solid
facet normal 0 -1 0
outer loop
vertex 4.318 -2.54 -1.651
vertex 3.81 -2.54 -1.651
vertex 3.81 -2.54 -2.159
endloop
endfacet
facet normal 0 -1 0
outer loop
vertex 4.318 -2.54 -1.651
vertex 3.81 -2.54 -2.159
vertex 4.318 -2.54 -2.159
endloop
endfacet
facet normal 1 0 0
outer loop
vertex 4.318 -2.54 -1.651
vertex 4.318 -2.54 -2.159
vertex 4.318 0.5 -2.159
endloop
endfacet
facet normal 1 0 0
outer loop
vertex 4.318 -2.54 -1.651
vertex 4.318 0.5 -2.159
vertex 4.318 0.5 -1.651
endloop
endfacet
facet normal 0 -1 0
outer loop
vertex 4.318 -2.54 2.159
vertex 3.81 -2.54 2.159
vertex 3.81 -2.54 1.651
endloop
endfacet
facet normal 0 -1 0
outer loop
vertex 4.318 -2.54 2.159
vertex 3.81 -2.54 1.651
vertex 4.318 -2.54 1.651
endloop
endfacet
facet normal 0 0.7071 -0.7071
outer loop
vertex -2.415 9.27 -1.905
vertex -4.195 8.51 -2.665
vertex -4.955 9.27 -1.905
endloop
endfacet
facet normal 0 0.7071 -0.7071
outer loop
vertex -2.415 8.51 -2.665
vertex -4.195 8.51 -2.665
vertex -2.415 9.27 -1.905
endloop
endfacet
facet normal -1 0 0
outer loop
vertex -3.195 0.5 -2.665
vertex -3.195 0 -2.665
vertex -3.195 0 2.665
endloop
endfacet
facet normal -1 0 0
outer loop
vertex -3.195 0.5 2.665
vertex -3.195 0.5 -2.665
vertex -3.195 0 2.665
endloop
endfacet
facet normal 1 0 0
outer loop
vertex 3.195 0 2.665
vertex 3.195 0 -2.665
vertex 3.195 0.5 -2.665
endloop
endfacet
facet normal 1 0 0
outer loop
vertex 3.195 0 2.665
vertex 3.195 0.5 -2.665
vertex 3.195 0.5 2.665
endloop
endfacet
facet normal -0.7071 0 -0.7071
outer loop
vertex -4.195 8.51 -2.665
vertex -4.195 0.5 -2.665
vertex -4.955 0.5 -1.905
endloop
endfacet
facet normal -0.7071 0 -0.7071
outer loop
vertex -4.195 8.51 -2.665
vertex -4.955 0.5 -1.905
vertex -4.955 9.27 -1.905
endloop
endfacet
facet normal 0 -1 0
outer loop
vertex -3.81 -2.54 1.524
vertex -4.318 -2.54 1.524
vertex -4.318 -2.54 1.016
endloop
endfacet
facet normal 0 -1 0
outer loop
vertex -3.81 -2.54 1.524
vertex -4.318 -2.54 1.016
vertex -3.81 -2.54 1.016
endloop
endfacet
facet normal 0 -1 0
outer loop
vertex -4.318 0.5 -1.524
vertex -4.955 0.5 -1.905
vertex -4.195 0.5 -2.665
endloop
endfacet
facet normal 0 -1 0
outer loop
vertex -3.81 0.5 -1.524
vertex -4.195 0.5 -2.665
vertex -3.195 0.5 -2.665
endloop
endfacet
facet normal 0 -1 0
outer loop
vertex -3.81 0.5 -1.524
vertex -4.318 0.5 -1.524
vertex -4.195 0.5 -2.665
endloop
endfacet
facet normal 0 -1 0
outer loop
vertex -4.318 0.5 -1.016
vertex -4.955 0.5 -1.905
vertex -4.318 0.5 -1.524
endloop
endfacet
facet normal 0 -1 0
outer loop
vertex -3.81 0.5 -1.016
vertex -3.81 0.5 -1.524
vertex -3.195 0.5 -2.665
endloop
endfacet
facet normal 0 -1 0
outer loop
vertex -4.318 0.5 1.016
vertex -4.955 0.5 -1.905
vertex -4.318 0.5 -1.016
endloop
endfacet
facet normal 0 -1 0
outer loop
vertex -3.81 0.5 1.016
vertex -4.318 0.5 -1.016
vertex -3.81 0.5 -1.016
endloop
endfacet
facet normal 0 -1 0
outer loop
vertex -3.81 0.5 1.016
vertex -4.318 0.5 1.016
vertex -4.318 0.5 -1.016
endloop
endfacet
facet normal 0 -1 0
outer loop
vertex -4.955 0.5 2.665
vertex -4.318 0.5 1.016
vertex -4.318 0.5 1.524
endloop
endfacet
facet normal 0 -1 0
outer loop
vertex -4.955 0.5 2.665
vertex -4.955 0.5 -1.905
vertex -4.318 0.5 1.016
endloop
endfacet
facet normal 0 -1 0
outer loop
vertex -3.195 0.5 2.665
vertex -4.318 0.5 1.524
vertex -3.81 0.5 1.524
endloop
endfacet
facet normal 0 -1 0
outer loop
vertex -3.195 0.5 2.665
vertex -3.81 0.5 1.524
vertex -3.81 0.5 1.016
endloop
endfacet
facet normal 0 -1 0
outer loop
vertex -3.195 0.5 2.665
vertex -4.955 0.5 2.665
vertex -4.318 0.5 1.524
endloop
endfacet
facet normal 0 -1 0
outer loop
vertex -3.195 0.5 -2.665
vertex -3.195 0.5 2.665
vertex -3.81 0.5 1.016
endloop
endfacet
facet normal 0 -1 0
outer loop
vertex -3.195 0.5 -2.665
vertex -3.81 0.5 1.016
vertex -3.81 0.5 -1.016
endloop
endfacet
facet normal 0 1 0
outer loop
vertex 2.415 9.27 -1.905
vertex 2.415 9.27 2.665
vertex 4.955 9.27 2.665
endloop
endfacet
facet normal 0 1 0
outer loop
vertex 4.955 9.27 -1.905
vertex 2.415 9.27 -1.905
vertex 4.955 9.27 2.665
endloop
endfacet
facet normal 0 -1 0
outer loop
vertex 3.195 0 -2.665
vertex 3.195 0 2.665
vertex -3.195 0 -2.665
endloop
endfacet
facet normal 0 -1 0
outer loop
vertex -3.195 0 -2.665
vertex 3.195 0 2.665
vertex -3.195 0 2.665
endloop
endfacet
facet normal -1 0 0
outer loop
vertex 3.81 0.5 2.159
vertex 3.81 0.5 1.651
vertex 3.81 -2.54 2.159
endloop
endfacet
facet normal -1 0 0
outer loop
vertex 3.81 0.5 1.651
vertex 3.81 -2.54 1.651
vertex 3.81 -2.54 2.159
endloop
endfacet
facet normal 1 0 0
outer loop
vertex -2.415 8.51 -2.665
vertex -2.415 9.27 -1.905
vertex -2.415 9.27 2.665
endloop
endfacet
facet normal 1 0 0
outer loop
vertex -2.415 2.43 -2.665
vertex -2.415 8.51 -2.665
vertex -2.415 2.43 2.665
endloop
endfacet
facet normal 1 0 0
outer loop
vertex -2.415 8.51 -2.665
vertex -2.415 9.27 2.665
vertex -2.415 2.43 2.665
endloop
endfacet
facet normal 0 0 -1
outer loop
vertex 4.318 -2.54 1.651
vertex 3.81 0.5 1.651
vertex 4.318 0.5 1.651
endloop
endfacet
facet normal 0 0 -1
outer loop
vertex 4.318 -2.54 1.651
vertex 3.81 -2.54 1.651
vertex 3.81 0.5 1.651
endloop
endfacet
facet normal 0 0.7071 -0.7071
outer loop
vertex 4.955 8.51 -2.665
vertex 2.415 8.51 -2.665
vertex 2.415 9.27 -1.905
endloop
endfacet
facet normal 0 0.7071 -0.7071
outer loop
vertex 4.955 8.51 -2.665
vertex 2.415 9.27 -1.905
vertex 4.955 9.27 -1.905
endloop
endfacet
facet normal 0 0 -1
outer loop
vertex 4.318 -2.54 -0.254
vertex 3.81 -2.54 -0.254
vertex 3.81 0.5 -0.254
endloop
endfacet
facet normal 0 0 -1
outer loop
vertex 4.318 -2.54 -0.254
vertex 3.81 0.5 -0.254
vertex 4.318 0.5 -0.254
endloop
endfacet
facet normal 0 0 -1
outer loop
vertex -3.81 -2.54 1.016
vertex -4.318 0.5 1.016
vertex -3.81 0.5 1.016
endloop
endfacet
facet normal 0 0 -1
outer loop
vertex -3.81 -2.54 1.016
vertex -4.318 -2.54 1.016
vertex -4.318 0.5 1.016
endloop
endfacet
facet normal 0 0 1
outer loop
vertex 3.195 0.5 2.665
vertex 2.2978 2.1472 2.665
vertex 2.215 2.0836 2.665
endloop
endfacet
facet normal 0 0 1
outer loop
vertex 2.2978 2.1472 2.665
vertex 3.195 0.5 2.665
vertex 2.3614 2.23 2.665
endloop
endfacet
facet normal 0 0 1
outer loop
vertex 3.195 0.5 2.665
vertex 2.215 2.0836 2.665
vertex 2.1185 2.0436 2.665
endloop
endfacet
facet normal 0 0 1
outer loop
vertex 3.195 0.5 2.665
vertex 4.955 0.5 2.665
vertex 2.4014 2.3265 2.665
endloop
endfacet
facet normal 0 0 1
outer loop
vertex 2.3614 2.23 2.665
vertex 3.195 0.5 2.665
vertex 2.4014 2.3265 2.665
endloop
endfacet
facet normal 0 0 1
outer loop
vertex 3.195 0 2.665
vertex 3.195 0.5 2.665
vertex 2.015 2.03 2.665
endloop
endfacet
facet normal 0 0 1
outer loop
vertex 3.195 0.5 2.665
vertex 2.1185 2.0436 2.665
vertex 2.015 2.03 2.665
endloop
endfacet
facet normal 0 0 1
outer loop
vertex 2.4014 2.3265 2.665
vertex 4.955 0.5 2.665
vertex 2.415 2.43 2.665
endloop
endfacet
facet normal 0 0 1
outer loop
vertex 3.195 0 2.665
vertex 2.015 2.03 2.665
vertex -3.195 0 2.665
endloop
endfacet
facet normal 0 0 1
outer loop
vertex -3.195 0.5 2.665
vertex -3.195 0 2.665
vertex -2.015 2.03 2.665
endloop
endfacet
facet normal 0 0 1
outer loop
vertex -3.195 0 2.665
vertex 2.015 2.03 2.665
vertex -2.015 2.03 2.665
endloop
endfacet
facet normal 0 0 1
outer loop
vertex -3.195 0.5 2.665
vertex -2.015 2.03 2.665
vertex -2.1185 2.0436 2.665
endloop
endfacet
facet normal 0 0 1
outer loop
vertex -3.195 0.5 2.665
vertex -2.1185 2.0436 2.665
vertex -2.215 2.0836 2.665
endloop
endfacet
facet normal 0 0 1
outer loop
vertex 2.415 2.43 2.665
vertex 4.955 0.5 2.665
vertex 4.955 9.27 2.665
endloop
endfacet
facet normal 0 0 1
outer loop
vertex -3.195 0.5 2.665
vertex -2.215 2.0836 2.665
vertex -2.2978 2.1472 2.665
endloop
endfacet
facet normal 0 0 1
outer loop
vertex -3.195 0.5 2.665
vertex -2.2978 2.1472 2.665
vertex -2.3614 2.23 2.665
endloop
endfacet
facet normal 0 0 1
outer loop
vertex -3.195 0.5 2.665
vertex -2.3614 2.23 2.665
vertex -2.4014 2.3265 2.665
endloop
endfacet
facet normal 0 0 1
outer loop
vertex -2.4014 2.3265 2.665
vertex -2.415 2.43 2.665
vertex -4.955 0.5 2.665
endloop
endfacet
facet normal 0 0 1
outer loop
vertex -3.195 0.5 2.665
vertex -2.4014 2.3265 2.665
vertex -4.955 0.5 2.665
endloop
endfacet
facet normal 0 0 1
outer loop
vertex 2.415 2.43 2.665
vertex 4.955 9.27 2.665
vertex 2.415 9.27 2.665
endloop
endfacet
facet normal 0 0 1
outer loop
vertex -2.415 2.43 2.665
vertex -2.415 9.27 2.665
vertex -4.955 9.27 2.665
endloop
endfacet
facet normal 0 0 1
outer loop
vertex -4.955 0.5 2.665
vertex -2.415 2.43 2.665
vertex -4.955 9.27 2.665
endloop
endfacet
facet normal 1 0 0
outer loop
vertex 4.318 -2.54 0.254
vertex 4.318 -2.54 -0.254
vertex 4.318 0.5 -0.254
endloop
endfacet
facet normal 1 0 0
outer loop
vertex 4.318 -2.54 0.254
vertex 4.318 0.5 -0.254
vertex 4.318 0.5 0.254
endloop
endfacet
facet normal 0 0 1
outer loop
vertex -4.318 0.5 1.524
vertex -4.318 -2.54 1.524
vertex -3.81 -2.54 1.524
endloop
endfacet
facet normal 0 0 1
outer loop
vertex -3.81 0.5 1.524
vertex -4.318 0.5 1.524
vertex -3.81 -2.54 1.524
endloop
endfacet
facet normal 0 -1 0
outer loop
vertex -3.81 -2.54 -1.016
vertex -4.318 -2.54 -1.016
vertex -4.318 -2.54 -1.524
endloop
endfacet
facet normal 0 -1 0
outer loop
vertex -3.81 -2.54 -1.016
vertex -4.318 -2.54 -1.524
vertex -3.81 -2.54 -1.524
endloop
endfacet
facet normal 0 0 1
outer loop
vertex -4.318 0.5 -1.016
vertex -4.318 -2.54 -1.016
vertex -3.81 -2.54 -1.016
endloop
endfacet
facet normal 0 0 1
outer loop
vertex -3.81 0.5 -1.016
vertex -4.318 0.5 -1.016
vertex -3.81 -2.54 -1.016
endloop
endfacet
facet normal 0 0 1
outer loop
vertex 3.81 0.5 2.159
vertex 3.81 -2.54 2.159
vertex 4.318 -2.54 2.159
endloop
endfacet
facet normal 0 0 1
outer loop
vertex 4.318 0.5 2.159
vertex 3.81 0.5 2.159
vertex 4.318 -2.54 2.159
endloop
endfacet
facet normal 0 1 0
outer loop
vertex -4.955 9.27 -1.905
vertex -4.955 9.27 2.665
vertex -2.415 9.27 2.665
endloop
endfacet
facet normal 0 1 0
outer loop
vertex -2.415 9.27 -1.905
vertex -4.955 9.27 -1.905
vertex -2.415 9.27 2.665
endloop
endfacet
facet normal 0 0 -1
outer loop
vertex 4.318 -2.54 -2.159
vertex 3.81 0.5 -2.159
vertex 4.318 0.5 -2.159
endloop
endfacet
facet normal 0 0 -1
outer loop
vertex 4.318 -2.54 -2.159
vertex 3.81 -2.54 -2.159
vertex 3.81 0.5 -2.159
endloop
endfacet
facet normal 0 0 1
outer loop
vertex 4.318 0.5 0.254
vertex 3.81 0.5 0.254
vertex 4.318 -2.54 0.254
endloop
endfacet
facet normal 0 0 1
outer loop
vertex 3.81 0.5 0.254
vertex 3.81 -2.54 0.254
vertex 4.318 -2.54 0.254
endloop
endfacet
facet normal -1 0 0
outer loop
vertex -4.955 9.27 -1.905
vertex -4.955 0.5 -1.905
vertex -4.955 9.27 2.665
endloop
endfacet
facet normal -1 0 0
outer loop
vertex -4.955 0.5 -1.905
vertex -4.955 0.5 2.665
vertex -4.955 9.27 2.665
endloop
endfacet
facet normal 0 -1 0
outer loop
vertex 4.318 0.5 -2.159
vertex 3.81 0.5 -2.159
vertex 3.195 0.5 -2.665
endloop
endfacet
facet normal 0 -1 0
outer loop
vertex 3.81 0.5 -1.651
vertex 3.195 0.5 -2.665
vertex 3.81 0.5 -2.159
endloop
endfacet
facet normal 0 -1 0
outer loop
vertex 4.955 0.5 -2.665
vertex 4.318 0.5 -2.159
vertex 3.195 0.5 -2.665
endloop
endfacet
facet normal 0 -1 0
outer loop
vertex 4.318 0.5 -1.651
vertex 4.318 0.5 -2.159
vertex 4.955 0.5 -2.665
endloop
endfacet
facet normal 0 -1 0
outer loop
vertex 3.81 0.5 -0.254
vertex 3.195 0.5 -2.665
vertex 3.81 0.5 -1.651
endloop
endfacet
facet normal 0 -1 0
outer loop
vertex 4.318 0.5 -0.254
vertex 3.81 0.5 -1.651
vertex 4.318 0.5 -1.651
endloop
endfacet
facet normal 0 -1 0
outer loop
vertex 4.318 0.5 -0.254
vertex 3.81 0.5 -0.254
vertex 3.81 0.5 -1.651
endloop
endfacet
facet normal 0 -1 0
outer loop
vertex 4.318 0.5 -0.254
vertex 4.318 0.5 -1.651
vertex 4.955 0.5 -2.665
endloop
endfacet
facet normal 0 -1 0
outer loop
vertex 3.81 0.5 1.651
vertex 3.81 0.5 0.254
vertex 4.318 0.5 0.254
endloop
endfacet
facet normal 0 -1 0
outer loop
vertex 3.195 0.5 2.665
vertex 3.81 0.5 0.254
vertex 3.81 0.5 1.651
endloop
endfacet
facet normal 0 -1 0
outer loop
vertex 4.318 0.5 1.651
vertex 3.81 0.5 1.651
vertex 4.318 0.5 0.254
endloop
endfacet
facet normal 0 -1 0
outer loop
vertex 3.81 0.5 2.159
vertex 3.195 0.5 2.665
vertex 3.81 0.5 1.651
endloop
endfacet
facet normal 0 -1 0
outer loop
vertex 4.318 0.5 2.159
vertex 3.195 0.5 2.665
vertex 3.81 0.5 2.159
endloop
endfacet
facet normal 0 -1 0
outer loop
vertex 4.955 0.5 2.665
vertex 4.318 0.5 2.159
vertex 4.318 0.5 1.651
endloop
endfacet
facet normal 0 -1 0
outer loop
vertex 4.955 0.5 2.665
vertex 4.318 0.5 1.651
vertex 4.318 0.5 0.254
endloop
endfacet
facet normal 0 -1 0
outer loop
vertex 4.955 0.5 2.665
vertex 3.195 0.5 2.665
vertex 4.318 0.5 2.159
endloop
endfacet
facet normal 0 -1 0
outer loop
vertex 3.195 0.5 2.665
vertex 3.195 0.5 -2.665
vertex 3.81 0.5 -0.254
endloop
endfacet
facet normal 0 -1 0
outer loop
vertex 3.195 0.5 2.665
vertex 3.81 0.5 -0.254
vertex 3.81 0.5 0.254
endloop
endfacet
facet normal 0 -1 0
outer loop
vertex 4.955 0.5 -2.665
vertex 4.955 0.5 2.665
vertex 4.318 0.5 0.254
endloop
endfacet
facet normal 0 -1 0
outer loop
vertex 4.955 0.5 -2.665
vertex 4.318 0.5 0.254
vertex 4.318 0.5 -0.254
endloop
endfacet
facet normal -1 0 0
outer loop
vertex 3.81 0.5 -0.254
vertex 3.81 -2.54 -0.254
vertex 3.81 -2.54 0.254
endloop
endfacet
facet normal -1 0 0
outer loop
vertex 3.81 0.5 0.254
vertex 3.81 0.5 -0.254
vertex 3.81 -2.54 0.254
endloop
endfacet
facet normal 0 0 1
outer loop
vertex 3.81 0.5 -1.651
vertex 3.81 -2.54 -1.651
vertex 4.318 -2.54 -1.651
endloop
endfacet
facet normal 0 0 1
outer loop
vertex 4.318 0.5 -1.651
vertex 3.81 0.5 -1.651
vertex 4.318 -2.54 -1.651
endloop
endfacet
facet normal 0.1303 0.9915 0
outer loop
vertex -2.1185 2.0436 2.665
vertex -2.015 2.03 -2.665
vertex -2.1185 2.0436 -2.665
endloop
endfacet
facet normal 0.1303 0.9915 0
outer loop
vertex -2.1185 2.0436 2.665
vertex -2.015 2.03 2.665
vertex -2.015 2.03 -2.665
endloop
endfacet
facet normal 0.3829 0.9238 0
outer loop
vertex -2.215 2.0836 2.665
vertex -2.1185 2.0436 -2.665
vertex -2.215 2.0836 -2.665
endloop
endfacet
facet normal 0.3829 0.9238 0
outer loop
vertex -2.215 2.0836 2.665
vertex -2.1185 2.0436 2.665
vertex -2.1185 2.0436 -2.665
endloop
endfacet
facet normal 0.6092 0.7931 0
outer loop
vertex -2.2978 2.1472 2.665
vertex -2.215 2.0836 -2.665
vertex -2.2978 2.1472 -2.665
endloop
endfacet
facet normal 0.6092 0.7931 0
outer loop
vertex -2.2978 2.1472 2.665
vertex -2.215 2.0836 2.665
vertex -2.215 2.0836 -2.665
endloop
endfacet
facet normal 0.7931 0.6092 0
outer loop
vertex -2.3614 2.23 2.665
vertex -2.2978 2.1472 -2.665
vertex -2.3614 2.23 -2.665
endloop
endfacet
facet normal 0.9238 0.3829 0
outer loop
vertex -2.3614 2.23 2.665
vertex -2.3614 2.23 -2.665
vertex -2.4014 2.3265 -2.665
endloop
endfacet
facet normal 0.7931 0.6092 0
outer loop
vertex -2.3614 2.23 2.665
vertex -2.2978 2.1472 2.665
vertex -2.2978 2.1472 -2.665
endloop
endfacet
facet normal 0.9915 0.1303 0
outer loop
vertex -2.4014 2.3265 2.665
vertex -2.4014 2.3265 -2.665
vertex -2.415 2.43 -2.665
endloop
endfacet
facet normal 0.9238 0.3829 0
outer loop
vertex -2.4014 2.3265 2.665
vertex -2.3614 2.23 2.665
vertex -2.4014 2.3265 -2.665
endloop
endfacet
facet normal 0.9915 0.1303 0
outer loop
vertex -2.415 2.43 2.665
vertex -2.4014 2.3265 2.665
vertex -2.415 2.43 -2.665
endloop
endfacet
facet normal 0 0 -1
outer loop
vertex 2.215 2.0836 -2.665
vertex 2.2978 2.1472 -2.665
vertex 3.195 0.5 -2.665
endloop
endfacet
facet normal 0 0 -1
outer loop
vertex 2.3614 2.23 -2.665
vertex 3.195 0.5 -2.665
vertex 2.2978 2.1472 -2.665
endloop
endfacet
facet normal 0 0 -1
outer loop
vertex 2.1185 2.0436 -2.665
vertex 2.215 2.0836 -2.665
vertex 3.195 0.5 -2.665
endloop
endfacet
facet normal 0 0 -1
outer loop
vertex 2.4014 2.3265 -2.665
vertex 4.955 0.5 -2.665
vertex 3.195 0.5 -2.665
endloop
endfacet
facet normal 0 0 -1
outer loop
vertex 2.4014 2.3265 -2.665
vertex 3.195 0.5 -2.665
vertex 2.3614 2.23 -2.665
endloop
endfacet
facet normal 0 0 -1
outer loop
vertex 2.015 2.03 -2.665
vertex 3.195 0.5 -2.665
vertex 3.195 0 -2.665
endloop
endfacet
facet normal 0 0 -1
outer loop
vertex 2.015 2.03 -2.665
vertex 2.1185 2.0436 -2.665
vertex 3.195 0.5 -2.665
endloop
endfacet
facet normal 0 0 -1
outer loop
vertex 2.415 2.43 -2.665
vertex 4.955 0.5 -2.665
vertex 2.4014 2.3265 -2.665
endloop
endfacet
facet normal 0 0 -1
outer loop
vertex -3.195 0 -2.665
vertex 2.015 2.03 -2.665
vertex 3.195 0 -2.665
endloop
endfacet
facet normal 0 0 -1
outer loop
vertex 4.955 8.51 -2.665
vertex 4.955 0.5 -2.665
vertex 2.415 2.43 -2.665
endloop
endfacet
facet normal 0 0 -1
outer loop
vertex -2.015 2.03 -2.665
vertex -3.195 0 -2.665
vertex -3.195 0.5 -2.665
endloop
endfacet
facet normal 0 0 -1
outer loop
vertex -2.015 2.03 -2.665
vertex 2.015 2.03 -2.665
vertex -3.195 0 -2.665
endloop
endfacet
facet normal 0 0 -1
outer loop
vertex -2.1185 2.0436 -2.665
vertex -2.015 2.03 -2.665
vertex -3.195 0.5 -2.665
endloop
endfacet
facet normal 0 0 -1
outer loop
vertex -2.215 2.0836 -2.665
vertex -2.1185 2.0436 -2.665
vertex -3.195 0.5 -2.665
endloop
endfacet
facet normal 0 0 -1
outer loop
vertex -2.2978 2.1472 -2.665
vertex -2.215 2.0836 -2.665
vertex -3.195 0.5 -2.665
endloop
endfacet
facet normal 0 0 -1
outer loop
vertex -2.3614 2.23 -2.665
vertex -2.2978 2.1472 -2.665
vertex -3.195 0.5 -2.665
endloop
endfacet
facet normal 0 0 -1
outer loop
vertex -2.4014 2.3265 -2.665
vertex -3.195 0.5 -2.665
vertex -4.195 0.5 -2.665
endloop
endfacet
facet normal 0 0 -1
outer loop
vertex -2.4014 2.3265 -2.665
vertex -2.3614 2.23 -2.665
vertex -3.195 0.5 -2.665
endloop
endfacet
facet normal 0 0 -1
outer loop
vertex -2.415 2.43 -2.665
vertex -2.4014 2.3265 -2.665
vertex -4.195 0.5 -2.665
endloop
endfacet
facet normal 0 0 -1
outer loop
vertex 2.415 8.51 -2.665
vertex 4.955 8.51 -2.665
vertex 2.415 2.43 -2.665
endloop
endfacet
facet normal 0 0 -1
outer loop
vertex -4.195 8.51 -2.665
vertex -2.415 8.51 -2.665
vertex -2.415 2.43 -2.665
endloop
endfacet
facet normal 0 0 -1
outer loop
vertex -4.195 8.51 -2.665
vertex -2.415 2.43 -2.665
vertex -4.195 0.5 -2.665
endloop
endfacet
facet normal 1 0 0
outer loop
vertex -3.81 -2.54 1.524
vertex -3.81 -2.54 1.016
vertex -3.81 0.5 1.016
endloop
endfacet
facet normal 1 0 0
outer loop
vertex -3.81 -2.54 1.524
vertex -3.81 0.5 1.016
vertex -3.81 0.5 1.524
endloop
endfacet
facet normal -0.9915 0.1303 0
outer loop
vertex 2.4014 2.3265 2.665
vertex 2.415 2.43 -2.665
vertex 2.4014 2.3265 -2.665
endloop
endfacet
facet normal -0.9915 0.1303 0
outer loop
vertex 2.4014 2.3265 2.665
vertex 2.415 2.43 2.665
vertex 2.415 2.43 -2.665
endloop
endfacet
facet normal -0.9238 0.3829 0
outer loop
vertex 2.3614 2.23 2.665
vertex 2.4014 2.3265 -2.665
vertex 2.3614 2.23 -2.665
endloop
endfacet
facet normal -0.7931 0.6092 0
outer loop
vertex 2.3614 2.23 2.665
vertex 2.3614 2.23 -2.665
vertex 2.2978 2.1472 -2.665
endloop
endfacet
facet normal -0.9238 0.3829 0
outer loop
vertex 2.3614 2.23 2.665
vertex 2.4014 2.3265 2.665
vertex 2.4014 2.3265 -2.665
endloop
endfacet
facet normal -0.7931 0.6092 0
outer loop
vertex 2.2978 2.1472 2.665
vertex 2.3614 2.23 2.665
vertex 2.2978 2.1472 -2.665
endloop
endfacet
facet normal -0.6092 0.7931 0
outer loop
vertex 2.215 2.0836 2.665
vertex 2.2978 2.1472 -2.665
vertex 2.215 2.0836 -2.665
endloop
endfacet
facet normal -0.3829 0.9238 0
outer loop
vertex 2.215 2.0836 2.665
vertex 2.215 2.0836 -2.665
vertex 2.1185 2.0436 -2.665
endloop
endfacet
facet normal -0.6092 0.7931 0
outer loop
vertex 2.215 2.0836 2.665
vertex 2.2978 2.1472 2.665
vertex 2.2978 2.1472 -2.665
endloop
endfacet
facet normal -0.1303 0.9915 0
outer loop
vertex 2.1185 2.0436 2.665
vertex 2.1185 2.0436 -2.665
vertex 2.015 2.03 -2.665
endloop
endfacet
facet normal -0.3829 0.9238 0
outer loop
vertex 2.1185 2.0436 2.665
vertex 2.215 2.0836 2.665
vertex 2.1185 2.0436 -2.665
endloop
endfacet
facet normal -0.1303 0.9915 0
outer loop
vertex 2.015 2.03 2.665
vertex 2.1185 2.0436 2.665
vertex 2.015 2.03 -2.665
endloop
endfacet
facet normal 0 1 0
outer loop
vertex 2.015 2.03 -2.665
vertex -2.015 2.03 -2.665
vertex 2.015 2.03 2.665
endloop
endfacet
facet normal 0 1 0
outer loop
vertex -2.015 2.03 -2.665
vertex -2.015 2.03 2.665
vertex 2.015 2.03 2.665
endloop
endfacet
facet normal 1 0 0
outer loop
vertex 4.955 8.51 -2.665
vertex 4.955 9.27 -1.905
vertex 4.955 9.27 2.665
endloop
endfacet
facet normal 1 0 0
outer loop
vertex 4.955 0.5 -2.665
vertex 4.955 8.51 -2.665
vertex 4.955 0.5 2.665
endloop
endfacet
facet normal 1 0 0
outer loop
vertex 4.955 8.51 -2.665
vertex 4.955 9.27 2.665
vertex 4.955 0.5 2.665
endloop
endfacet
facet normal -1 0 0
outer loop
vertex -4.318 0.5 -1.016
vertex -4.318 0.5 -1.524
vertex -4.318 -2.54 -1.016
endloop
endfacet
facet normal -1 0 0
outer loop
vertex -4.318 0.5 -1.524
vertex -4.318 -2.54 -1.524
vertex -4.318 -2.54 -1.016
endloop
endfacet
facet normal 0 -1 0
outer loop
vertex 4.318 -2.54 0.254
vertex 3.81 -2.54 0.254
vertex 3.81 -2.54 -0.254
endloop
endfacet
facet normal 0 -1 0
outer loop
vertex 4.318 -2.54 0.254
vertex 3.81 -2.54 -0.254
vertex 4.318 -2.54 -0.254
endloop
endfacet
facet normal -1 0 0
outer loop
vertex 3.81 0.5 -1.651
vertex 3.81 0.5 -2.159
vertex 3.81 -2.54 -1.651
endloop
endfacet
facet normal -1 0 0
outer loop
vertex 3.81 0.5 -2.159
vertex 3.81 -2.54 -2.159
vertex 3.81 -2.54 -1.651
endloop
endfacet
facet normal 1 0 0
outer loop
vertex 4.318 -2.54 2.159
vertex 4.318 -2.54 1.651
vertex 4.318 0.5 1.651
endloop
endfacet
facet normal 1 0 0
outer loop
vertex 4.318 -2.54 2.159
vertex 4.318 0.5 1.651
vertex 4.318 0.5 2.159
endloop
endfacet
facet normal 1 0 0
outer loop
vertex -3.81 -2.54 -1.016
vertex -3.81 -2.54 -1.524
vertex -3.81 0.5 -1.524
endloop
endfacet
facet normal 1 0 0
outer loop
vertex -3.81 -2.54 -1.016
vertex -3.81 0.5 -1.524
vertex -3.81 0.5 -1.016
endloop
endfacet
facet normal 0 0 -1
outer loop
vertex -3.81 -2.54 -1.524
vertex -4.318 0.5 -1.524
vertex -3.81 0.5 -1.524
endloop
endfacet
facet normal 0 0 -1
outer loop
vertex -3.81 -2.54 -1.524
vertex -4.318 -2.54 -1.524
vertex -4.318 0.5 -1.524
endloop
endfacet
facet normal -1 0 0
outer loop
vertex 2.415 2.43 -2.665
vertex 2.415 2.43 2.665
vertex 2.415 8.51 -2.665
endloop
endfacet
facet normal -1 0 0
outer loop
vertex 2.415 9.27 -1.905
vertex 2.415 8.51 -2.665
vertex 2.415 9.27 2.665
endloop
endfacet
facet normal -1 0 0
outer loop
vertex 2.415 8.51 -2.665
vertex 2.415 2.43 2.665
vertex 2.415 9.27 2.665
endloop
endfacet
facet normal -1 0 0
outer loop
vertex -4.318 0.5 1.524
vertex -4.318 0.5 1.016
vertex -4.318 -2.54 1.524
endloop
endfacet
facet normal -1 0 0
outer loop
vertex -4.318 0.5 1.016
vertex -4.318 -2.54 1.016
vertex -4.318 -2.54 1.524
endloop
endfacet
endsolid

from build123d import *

# Parameters (mm, degrees)
BOSS_EXTRUDE1_DEPTH      = 2.665
CHAMFER1_SIZE            = 0.76
SKETCH2_W                = 1.76
SKETCH2_H                = 5.33
CUT_EXTRUDE1_DEPTH       = 0.5
FILLET1_R                = 0.4
SKETCH3_W                = 0.508
SKETCH3_H                = 0.508
BOSS_EXTRUDE2_DEPTH      = 2.54
BOSS_EXTRUDE2_DEPTH_BACK = 0.5


with BuildPart() as part:
    # Sketch1 → Boss-Extrude1 (new body, symmetric)
    with BuildSketch(Plane.XY):
        Polygon((2.415, 9.27), (4.955, 9.27), (4.955, 0), (-4.955, 0), (-4.955, 9.27), (-2.415, 9.27), (-2.415, 2.03), (2.415, 2.03), align=None)
    extrude(amount=BOSS_EXTRUDE1_DEPTH, both=True)

    # Chamfer1
    chamfer1_edges = [part.edges().sort_by_distance(p)[0] for p in [
        (-4.955, 4.635, -2.665),
        (-3.685, 9.27, -2.665),
        (3.685, 9.27, -2.665),
    ]]
    chamfer(chamfer1_edges, length=CHAMFER1_SIZE)

    # Sketch2 → Cut-Extrude1 (cut)
    with BuildSketch(Plane.XZ):
        with Locations((-4.075, 0)):
            Rectangle(SKETCH2_W, SKETCH2_H)
        with Locations((4.075, 0)):
            Rectangle(SKETCH2_W, SKETCH2_H)
    extrude(amount=-CUT_EXTRUDE1_DEPTH, mode=Mode.SUBTRACT)

    # Fillet1
    fillet1_edges = [part.edges().sort_by_distance(p)[0] for p in [
        (-2.415, 2.03, 0),
        (2.415, 2.03, 0),
    ]]
    fillet(fillet1_edges, radius=FILLET1_R)

    # Sketch3 → Boss-Extrude2 (add, two sides)
    with BuildSketch(Plane.XZ) as boss_extrude2_sk:
        with Locations((4.064, 0)):
            Rectangle(SKETCH3_W, SKETCH3_H)
        with Locations((-4.064, 1.27)):
            Rectangle(SKETCH3_W, SKETCH3_H)
        with Locations((-4.064, -1.27)):
            Rectangle(SKETCH3_W, SKETCH3_H)
        with Locations((4.064, 1.905)):
            Rectangle(SKETCH3_W, SKETCH3_H)
        with Locations((4.064, -1.905)):
            Rectangle(SKETCH3_W, SKETCH3_H)
    extrude(amount=BOSS_EXTRUDE2_DEPTH)
    extrude(boss_extrude2_sk.sketch, amount=-BOSS_EXTRUDE2_DEPTH_BACK)


solid = part.part
